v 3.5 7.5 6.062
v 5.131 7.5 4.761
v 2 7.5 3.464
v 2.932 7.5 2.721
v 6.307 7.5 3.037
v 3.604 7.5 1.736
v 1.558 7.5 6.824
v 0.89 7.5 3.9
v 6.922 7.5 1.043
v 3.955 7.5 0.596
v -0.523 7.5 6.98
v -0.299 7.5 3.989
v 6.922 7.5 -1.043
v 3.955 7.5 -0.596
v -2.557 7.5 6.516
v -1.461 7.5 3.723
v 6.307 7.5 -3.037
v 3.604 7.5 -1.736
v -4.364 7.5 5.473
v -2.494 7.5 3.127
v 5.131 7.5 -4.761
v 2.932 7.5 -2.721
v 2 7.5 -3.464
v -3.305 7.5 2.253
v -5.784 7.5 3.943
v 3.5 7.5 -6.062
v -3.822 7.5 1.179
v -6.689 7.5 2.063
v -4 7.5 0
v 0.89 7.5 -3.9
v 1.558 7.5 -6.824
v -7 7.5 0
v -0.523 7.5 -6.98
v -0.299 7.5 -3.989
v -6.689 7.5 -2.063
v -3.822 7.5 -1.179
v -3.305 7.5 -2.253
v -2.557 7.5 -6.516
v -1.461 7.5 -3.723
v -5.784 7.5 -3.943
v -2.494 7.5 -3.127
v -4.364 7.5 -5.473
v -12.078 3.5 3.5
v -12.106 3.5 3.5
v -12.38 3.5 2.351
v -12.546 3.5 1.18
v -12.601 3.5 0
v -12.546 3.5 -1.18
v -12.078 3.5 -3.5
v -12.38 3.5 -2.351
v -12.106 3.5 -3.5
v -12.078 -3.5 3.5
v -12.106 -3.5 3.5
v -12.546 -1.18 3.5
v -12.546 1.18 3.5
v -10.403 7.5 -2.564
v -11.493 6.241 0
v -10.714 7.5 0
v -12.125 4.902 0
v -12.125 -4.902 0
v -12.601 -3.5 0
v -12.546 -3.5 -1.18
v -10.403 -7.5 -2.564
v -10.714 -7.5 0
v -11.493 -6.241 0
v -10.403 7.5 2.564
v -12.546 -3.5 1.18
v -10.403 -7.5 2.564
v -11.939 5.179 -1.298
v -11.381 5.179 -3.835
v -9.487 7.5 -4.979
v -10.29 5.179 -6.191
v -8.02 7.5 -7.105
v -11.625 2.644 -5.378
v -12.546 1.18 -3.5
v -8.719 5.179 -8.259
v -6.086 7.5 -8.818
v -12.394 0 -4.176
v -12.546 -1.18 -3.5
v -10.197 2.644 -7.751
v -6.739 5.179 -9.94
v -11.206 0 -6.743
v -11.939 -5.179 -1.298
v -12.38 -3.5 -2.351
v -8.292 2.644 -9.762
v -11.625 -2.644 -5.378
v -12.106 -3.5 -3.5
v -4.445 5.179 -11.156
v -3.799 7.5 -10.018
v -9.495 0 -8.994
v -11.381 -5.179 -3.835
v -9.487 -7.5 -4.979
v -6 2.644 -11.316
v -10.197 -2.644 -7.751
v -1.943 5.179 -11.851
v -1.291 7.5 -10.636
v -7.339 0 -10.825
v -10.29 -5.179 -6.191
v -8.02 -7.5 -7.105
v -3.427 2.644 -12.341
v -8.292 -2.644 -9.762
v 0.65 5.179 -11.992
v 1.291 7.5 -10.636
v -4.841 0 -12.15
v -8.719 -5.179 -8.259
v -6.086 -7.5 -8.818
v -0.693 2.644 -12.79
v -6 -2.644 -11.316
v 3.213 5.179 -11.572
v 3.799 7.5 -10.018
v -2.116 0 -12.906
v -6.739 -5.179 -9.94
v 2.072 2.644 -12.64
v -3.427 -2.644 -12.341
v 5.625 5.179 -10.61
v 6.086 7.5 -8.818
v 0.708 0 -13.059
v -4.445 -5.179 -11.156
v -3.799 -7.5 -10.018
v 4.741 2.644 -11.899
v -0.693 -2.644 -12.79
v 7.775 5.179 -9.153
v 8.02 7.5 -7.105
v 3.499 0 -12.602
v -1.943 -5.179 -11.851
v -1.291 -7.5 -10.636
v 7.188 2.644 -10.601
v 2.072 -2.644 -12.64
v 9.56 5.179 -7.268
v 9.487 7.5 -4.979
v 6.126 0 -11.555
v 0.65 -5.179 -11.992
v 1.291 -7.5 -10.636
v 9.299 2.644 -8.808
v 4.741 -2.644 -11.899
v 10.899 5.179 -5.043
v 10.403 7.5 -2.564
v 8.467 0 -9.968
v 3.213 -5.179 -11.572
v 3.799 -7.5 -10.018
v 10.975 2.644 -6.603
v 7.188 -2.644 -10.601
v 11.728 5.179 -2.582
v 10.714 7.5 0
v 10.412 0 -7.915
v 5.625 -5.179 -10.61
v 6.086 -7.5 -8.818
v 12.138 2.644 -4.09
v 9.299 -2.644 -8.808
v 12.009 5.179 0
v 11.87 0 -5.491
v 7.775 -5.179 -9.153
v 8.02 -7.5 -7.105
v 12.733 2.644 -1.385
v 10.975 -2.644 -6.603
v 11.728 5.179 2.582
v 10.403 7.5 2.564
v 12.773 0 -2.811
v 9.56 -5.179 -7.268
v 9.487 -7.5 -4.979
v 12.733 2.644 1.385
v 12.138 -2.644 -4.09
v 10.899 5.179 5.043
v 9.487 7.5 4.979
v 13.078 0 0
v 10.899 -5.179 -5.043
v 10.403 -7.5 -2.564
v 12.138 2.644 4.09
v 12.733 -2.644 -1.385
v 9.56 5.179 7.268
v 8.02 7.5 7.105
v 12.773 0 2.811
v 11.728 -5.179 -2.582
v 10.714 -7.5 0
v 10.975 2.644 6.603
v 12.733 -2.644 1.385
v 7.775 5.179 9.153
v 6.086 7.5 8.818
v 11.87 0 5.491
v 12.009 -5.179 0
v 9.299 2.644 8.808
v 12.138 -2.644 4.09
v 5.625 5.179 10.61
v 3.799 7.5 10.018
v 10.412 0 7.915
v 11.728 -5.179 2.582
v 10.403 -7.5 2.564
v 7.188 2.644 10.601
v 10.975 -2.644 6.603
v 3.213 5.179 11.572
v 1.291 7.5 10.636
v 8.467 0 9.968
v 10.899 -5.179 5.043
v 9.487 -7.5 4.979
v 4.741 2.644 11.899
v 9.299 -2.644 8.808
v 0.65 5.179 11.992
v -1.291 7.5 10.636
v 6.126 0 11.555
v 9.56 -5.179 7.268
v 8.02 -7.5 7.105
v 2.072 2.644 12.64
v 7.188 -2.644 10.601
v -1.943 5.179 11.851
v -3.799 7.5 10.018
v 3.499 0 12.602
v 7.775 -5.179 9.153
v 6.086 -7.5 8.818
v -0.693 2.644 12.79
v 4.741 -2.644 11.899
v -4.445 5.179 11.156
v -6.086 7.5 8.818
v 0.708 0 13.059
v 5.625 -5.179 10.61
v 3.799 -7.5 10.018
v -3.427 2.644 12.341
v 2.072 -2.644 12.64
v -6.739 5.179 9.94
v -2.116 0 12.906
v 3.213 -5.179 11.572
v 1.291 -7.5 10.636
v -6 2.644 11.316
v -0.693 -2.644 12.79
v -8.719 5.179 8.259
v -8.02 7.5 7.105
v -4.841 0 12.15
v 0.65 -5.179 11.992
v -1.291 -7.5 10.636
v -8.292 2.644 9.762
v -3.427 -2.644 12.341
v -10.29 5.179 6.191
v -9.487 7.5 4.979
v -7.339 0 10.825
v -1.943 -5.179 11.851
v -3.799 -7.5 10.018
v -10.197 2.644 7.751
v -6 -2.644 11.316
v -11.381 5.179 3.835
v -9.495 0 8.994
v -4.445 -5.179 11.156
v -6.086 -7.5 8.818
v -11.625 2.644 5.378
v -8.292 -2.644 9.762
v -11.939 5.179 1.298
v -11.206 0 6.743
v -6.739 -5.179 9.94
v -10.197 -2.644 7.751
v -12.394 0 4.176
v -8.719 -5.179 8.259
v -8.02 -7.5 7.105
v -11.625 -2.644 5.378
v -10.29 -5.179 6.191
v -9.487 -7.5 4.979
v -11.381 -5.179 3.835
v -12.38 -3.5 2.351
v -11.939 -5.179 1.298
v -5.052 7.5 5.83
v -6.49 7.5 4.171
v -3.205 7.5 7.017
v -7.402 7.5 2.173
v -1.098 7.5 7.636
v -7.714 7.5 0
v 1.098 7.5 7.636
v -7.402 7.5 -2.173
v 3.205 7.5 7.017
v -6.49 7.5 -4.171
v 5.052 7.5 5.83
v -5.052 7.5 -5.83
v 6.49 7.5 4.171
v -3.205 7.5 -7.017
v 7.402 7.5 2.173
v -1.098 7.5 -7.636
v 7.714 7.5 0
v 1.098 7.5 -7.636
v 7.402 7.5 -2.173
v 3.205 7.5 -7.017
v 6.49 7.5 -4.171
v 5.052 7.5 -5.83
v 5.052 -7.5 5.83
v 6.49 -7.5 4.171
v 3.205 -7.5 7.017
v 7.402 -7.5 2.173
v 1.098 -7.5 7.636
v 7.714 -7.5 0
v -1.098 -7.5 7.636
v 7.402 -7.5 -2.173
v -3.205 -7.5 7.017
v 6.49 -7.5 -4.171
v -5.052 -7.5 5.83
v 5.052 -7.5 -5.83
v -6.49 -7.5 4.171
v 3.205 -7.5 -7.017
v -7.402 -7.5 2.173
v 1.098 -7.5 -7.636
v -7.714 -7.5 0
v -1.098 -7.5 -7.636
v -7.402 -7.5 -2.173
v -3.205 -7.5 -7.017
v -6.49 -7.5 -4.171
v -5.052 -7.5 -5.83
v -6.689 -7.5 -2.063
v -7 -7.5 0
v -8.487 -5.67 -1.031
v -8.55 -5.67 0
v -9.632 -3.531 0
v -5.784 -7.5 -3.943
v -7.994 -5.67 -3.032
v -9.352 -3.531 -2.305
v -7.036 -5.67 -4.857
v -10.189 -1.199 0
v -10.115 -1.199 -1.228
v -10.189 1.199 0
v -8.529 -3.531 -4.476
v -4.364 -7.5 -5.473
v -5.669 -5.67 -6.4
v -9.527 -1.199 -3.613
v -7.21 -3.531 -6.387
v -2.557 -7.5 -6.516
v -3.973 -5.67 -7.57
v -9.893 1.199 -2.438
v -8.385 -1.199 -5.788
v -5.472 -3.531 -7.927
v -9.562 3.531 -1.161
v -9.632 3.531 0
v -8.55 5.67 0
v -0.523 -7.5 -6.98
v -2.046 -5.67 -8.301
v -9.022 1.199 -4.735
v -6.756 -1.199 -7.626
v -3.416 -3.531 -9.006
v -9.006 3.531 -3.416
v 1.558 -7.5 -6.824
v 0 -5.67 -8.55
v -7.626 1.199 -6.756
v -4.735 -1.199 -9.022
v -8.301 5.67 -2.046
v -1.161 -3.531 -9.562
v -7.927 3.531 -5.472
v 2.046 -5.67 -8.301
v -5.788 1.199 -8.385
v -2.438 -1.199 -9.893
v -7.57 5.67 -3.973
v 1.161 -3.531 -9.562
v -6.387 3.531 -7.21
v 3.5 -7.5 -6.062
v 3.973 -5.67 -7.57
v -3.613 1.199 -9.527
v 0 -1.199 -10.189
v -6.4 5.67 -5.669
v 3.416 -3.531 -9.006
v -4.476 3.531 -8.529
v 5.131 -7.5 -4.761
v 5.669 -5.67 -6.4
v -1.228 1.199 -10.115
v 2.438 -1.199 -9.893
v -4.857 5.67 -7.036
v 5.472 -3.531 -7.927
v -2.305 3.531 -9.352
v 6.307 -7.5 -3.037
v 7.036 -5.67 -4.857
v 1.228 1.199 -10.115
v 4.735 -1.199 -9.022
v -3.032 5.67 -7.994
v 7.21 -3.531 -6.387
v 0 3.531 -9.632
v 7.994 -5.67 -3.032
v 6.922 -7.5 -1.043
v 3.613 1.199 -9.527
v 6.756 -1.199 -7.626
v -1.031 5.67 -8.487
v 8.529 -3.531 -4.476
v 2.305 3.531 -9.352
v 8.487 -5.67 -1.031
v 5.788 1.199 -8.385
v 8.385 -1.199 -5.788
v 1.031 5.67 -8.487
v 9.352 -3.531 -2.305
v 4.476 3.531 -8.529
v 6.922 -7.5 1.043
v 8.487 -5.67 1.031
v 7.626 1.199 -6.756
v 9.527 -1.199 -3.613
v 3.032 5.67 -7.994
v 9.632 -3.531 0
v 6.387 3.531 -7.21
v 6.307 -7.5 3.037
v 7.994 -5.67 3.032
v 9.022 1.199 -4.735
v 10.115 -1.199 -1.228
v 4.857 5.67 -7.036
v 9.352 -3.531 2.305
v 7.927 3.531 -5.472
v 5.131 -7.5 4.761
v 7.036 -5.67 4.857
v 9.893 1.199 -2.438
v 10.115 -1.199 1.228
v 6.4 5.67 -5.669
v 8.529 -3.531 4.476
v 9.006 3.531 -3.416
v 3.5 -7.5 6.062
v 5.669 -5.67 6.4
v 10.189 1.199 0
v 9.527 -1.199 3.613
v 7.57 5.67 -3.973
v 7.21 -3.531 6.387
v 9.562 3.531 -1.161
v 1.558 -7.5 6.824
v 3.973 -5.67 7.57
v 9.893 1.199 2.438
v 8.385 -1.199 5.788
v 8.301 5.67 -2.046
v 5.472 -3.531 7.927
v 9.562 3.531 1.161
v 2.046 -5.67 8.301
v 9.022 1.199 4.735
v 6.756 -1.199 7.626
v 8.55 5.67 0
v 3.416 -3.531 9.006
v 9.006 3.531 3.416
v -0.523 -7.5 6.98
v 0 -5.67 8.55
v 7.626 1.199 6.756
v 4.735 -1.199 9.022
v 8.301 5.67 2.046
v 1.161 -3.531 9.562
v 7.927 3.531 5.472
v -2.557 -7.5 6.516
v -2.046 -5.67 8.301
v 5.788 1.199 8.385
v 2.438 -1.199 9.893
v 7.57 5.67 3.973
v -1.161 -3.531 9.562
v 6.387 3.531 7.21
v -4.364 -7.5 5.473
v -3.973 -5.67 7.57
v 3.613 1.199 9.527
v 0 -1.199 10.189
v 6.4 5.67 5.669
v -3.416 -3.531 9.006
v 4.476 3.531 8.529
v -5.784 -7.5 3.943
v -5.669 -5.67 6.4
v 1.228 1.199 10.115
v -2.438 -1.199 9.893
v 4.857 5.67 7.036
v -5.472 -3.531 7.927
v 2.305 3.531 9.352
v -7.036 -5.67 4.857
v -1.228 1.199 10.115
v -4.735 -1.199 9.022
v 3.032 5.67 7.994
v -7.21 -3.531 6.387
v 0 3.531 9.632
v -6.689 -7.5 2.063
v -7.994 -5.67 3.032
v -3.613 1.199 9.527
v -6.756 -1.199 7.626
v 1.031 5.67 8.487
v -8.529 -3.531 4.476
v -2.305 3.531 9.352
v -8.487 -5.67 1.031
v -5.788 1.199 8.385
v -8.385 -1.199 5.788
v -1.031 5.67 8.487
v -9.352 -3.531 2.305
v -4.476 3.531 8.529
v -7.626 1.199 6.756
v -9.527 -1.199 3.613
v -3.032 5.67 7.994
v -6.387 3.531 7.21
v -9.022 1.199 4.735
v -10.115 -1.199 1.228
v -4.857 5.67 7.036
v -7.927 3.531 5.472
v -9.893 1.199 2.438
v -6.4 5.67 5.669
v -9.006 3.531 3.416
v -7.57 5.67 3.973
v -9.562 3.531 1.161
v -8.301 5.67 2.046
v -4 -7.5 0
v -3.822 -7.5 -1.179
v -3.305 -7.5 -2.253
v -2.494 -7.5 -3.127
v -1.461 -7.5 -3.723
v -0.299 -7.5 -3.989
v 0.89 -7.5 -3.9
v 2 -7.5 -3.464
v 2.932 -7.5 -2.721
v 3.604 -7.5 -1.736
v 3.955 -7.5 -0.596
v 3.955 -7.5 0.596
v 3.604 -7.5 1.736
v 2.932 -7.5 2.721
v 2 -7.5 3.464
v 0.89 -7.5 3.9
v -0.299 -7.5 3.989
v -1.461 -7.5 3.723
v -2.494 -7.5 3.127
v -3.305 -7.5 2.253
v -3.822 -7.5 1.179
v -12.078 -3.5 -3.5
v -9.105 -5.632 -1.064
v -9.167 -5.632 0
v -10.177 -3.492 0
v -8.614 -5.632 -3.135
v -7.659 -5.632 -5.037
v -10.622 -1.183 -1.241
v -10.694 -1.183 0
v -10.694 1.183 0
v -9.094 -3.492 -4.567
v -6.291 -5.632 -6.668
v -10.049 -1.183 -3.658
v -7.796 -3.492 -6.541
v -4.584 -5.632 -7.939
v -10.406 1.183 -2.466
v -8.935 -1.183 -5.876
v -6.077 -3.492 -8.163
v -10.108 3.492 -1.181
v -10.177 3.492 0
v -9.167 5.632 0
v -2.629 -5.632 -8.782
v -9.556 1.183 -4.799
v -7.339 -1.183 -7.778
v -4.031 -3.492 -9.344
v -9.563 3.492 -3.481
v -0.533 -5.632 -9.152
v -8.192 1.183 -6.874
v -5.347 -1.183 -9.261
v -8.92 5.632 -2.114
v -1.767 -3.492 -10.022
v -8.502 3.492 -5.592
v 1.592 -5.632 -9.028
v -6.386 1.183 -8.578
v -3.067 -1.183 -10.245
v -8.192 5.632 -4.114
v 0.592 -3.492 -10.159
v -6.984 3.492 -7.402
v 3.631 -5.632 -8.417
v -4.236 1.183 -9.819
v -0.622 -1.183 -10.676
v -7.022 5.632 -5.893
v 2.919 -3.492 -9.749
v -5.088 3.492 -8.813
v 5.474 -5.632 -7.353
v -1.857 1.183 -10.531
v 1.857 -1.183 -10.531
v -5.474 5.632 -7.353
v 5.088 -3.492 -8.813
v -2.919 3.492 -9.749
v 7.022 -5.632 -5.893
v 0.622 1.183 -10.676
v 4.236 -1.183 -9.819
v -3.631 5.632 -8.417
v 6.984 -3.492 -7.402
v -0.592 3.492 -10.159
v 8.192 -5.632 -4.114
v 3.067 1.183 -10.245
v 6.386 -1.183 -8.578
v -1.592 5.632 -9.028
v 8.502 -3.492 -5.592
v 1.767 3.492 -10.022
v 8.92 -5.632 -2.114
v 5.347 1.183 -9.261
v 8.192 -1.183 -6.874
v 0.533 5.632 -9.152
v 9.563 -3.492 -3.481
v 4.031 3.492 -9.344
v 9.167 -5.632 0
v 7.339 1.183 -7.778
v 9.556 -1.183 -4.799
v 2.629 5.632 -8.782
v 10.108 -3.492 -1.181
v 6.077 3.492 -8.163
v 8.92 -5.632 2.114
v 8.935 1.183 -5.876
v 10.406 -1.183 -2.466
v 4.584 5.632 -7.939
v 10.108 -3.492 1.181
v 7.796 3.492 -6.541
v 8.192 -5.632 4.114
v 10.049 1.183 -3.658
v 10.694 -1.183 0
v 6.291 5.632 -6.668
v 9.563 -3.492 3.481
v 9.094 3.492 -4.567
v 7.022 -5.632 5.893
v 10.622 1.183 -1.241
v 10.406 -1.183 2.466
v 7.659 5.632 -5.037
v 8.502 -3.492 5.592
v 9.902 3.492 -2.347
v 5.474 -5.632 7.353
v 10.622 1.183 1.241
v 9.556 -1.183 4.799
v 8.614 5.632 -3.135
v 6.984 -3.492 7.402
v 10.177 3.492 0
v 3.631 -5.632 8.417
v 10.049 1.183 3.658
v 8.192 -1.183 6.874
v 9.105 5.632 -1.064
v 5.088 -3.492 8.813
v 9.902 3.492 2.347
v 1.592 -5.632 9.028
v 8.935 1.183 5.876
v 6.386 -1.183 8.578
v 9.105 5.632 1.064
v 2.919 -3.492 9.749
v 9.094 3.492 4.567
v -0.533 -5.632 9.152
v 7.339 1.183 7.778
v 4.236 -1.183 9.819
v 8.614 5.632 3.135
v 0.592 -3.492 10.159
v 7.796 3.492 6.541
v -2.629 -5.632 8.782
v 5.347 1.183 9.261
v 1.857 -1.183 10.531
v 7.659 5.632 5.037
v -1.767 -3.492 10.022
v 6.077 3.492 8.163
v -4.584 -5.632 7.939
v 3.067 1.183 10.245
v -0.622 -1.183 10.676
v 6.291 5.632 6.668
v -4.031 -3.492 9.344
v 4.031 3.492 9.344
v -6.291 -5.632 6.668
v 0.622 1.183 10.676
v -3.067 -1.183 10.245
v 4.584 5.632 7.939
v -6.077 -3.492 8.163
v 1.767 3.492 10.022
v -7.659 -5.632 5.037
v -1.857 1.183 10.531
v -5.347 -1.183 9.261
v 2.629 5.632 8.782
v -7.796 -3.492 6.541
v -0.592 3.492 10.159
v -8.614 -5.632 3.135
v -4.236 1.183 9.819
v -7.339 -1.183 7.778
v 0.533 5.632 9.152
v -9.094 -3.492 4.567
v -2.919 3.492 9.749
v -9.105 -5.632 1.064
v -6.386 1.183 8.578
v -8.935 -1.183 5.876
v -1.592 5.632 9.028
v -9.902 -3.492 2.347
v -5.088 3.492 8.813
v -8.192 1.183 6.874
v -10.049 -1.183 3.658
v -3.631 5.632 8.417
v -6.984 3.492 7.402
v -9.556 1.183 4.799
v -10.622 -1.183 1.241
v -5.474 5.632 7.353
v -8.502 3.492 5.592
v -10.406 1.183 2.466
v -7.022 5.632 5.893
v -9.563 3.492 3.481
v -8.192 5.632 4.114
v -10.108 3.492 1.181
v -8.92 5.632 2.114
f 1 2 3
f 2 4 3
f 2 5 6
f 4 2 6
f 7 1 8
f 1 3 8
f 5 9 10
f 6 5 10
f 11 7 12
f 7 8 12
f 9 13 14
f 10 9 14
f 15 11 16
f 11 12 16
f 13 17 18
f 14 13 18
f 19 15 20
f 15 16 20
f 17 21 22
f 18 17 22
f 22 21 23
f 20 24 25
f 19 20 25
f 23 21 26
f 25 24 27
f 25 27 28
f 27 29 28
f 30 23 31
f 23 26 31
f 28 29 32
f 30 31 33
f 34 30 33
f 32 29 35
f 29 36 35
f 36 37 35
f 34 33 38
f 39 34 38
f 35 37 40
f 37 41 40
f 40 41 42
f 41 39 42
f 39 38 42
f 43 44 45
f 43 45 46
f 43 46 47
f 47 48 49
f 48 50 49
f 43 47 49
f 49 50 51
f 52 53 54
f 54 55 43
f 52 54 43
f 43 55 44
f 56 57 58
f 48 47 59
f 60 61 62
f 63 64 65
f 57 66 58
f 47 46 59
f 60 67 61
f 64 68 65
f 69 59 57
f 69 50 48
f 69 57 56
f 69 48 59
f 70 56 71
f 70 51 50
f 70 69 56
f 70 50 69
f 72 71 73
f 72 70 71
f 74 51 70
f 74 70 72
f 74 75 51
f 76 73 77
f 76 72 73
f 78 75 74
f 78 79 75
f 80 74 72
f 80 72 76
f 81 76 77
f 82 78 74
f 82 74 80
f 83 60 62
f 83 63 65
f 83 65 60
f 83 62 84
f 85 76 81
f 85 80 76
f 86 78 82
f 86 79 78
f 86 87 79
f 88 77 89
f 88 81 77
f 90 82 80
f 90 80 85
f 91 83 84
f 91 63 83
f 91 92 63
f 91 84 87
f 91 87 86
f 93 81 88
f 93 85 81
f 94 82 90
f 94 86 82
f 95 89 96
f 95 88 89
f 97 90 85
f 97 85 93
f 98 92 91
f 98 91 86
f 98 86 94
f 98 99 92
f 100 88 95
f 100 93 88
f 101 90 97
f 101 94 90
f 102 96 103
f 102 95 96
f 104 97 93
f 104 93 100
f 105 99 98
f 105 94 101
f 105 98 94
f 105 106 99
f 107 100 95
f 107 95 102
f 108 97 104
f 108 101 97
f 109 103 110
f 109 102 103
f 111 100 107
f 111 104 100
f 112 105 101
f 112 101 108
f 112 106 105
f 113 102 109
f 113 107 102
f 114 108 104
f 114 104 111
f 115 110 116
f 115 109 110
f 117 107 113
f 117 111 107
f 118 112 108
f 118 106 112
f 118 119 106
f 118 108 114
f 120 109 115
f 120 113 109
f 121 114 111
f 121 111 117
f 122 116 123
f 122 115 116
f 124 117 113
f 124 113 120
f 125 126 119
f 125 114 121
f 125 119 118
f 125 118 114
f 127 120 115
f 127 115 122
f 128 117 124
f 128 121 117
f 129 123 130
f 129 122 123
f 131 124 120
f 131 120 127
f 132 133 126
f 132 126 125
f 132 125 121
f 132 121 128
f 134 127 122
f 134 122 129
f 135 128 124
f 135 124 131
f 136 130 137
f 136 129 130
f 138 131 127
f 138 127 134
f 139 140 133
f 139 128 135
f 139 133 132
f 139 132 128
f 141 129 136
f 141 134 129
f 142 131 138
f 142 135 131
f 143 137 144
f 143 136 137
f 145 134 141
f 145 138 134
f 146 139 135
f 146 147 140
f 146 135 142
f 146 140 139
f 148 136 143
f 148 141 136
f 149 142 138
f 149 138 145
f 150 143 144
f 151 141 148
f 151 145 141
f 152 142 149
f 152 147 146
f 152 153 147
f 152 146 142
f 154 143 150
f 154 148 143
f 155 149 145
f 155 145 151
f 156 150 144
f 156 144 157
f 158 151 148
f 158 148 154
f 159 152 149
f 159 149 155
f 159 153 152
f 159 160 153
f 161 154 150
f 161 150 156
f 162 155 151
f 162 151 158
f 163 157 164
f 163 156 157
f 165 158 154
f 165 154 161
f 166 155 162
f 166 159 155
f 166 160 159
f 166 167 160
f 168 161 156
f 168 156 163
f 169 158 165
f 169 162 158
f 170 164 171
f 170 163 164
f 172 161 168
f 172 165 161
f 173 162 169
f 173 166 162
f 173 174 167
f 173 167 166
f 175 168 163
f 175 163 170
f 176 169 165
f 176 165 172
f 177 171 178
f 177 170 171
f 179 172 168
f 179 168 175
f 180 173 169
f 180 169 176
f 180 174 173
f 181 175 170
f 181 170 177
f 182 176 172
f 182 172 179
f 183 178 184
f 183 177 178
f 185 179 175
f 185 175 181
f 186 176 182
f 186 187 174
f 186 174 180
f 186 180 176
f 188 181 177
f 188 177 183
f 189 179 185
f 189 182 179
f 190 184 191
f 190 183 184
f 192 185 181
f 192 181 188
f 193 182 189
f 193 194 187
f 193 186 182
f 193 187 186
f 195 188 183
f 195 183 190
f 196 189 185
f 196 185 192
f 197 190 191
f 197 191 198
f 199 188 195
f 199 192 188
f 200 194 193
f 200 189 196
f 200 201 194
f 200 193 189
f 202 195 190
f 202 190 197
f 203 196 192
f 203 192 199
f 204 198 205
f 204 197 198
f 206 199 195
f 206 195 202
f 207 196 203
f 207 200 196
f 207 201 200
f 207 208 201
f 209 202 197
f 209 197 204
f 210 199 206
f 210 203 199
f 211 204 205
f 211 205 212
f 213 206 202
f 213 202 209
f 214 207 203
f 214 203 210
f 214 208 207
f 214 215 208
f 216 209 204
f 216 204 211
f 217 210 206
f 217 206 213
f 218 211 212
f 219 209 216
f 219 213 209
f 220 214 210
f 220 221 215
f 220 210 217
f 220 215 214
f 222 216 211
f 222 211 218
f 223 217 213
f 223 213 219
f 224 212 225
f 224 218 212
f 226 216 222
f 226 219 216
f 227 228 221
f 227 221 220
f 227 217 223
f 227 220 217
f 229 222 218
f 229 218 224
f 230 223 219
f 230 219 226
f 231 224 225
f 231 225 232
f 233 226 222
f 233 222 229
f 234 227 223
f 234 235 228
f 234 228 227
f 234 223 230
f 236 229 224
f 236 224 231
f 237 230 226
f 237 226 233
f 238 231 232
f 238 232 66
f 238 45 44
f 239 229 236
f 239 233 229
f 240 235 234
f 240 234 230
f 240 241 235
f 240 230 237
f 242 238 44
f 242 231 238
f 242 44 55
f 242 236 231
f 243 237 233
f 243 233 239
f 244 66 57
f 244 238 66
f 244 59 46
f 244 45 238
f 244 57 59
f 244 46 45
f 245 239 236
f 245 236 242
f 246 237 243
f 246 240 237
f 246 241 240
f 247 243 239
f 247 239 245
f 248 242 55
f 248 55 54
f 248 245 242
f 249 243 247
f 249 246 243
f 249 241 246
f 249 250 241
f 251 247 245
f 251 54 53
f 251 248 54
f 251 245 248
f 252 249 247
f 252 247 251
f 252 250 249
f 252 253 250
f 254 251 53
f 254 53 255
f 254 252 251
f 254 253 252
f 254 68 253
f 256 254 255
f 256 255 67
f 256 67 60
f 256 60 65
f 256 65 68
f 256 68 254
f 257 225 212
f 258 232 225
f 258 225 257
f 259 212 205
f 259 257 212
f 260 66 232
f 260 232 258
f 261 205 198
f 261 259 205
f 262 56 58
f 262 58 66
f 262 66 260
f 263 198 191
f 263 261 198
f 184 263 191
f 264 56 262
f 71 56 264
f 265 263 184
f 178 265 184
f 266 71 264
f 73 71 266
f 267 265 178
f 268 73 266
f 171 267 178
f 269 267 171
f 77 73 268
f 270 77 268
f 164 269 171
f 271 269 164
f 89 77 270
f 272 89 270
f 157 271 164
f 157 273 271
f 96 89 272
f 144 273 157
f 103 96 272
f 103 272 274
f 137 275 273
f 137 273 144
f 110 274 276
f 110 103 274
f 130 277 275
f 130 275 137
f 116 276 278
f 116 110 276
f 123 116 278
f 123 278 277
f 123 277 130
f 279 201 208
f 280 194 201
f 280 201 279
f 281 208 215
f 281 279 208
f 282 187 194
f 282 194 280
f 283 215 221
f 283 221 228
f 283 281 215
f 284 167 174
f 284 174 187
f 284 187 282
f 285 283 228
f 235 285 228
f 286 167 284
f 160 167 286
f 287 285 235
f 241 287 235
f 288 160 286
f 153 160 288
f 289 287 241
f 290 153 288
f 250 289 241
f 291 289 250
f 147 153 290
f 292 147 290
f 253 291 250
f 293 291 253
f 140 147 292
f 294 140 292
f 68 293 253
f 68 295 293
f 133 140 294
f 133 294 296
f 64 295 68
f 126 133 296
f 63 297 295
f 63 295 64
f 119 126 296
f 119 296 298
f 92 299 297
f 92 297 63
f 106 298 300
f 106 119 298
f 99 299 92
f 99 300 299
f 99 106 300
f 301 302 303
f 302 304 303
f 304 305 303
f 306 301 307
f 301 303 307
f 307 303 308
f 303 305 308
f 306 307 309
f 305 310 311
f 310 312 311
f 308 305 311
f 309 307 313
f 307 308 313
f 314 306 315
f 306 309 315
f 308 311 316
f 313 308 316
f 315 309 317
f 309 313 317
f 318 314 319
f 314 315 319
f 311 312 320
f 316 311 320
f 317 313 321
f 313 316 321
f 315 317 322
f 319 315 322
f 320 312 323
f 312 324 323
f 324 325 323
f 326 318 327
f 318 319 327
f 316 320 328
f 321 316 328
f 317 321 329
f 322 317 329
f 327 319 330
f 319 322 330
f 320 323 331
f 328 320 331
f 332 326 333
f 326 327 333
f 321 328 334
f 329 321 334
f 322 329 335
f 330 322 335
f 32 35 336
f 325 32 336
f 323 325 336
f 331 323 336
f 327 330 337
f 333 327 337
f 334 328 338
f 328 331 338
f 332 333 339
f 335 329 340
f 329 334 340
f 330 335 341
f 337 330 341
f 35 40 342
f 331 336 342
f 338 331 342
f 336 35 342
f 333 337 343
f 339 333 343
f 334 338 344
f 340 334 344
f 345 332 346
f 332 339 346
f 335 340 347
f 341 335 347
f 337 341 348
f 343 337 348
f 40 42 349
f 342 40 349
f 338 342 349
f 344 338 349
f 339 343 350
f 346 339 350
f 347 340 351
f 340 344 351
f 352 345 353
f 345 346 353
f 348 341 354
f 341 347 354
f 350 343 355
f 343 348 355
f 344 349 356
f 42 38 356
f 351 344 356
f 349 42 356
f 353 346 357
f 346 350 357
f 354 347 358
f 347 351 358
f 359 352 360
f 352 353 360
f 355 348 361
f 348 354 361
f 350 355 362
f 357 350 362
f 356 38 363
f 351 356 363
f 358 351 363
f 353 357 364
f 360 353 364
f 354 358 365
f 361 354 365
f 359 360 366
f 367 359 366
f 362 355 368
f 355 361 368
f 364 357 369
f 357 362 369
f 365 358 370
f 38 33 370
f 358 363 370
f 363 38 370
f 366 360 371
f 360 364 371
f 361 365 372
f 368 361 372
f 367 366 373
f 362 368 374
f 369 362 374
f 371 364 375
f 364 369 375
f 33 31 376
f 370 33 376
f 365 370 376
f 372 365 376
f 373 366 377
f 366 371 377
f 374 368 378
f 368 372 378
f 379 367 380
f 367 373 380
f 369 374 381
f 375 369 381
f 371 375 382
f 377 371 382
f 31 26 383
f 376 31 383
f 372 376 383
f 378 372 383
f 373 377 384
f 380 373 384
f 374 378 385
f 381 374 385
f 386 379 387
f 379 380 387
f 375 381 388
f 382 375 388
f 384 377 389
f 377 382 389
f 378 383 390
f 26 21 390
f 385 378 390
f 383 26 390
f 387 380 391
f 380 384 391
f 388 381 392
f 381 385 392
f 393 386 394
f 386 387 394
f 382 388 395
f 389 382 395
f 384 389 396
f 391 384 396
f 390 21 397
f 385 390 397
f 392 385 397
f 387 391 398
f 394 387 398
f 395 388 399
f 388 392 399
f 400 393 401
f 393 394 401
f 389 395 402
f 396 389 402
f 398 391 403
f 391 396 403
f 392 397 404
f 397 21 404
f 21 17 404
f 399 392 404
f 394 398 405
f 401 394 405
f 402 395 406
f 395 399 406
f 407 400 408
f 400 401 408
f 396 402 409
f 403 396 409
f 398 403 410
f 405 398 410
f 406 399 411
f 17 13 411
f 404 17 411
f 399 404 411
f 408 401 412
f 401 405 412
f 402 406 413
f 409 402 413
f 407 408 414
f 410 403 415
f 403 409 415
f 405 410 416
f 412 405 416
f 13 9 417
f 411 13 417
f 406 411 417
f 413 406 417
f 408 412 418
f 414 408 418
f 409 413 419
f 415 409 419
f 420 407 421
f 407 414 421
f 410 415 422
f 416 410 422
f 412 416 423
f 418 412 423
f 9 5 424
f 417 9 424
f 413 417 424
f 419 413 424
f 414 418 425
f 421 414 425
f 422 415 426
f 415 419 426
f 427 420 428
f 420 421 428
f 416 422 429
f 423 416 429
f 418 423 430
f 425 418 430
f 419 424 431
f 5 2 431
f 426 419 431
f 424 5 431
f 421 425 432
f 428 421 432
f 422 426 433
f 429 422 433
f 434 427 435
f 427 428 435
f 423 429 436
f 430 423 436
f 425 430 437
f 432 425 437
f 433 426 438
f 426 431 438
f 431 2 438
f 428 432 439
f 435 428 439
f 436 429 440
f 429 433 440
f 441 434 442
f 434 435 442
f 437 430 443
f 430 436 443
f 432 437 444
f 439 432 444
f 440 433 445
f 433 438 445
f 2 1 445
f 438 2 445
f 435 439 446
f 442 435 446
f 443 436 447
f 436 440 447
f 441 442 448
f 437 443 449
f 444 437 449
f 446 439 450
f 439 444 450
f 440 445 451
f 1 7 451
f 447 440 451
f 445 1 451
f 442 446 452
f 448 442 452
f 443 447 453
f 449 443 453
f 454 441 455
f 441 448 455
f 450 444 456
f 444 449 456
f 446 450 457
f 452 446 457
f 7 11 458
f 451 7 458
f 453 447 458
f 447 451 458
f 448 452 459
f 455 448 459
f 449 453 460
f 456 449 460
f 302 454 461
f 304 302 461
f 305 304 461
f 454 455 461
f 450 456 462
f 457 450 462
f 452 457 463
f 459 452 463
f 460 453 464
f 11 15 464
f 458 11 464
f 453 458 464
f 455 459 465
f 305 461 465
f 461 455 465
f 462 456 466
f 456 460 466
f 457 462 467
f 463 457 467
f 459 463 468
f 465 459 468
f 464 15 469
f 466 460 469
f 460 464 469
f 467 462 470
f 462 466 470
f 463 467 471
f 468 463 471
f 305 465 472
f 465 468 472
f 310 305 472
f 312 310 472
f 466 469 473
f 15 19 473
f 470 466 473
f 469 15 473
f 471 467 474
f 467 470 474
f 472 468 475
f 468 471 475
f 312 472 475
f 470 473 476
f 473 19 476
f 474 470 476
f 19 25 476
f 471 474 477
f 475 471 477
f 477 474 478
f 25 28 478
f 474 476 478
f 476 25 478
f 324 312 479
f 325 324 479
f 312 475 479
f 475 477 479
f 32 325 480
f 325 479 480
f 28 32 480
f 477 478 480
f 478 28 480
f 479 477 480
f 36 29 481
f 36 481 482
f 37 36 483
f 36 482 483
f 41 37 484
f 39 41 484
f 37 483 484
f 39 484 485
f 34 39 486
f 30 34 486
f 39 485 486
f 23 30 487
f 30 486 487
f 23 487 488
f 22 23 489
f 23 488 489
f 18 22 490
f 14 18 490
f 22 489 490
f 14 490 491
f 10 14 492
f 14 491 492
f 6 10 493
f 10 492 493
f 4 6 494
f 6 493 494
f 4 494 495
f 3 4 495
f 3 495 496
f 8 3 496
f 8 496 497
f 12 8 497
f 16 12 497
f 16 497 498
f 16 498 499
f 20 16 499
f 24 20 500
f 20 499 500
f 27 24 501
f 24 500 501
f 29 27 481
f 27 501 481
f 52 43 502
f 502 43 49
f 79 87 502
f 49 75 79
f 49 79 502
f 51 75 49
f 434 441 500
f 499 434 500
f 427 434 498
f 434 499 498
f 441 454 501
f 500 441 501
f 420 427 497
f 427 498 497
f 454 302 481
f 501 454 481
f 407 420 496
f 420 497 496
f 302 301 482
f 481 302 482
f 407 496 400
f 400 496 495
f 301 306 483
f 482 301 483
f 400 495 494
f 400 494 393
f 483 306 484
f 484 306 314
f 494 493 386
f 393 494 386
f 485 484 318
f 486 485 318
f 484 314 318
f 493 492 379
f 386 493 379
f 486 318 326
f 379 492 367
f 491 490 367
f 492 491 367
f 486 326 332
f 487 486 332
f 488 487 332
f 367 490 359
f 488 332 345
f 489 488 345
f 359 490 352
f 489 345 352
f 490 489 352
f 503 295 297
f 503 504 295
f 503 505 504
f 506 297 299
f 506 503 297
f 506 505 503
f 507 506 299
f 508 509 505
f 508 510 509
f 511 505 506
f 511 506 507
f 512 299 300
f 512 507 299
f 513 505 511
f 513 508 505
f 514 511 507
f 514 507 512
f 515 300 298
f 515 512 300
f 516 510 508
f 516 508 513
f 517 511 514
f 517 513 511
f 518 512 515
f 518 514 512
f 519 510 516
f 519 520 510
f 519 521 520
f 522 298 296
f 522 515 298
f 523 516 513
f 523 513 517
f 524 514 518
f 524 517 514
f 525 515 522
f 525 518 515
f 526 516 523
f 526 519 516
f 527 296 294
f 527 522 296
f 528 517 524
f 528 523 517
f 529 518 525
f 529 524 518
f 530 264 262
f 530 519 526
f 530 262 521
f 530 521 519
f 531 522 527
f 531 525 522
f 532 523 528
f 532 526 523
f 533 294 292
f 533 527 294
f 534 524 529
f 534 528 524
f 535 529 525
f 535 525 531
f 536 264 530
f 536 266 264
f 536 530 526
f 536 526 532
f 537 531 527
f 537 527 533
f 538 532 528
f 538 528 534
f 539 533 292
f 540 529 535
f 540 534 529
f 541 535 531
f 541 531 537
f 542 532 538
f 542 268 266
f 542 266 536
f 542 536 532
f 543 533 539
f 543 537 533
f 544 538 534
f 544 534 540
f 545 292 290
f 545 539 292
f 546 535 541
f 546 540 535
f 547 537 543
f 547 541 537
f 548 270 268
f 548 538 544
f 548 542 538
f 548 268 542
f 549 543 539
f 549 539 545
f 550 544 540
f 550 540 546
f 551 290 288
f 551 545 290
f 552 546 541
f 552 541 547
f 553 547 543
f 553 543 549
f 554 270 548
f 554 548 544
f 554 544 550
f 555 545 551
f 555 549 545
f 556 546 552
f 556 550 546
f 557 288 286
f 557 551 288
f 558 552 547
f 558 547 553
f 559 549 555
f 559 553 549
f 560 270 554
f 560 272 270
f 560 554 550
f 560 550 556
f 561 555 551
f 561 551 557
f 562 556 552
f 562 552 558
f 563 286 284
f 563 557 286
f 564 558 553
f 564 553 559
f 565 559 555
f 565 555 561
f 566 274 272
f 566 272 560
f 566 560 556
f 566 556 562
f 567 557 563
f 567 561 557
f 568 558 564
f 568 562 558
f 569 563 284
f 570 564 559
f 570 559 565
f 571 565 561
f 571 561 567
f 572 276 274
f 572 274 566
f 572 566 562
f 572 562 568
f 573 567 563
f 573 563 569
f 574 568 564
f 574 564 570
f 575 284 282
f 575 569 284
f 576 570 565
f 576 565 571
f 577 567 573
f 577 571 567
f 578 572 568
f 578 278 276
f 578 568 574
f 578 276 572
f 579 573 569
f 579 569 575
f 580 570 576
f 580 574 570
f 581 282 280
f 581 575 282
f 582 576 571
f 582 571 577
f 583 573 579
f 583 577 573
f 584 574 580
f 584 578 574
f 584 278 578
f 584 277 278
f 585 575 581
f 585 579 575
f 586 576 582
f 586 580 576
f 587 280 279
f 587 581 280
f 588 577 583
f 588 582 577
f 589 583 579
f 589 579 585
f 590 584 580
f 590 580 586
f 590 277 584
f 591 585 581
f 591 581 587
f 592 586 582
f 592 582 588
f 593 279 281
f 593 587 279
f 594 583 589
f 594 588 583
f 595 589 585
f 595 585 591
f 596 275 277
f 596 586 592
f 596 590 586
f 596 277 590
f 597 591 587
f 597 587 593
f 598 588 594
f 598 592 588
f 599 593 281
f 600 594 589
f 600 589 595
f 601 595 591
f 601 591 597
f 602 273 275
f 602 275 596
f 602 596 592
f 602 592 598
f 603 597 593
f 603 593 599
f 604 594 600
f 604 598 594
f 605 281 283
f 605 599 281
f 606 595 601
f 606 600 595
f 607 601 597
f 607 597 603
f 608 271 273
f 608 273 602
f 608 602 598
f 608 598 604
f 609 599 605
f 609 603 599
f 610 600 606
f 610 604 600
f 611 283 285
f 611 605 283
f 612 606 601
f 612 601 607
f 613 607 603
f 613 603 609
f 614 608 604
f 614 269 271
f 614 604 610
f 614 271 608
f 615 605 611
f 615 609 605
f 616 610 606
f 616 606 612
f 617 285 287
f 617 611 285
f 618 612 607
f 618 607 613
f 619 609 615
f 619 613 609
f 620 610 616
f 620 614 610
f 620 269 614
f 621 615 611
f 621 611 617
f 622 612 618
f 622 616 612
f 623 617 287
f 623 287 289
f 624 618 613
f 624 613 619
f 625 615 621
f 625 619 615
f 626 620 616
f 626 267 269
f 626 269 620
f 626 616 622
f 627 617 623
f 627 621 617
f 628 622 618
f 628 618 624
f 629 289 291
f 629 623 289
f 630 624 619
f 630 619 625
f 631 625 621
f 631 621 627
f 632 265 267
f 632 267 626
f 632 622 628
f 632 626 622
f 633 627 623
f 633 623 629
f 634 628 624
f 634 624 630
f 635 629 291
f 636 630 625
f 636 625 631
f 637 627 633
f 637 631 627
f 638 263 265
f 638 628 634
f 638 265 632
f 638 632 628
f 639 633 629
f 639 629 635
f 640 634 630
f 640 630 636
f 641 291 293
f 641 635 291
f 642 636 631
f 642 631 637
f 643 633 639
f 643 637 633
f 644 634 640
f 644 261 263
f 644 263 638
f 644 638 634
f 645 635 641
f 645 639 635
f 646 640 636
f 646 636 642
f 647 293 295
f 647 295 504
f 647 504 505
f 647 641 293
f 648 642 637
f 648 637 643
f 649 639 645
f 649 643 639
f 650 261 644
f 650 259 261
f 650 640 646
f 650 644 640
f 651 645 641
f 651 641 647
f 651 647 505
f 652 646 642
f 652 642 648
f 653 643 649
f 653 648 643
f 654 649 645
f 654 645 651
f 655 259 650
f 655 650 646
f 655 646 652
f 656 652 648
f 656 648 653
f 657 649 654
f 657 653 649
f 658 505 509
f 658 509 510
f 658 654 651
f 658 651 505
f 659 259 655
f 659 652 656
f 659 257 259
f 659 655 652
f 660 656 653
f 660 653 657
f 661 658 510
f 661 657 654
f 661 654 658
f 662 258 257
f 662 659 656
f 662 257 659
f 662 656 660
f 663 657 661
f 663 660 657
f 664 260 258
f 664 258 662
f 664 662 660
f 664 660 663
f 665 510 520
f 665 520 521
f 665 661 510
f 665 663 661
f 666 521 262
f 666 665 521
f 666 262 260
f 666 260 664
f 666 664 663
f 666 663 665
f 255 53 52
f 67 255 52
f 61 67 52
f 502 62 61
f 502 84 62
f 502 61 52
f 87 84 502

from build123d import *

# Parameters (mm, degrees)
CROQUIS3_W            = 7
CROQUIS3_H            = 7
CORTAR_EXTRUIR1_DEPTH = 1


with BuildPart() as part:
    # Croquis2 → Revolución1 (revolve)
    with BuildSketch(Plane.XY):
        with BuildLine():
            Line((-7.714216892, 7.5), (-10.714216892, 7.5))
            ThreePointArc((-10.714216892, 7.5), (-13.078396064, 0), (-10.714216892, -7.5))
            Line((-10.714216892, -7.5), (-7.714216892, -7.5))
            ThreePointArc((-7.714216892, -7.5), (-10.759142264, 0), (-7.714216892, 7.5))
        make_face()
        with BuildLine():
            Line((-4, 7.5), (-4, -7.5))
            Line((-4, -7.5), (-7, -7.5))
            ThreePointArc((-7, -7.5), (-10.259142264, 0), (-7, 7.5))
            Line((-7, 7.5), (-4, 7.5))
        make_face()
    revolve(axis=Axis((0, 7.5, 0), (0, -1, 0)))

    # Croquis3 → Cortar-Extruir1 (cut)
    with BuildSketch(Plane(origin=(-13.078396064, 0, 0), x_dir=(0, 0, -1), z_dir=(1, 0, 0))):
        Rectangle(CROQUIS3_W, CROQUIS3_H)
    extrude(amount=CORTAR_EXTRUIR1_DEPTH, mode=Mode.SUBTRACT)


solid = part.part
